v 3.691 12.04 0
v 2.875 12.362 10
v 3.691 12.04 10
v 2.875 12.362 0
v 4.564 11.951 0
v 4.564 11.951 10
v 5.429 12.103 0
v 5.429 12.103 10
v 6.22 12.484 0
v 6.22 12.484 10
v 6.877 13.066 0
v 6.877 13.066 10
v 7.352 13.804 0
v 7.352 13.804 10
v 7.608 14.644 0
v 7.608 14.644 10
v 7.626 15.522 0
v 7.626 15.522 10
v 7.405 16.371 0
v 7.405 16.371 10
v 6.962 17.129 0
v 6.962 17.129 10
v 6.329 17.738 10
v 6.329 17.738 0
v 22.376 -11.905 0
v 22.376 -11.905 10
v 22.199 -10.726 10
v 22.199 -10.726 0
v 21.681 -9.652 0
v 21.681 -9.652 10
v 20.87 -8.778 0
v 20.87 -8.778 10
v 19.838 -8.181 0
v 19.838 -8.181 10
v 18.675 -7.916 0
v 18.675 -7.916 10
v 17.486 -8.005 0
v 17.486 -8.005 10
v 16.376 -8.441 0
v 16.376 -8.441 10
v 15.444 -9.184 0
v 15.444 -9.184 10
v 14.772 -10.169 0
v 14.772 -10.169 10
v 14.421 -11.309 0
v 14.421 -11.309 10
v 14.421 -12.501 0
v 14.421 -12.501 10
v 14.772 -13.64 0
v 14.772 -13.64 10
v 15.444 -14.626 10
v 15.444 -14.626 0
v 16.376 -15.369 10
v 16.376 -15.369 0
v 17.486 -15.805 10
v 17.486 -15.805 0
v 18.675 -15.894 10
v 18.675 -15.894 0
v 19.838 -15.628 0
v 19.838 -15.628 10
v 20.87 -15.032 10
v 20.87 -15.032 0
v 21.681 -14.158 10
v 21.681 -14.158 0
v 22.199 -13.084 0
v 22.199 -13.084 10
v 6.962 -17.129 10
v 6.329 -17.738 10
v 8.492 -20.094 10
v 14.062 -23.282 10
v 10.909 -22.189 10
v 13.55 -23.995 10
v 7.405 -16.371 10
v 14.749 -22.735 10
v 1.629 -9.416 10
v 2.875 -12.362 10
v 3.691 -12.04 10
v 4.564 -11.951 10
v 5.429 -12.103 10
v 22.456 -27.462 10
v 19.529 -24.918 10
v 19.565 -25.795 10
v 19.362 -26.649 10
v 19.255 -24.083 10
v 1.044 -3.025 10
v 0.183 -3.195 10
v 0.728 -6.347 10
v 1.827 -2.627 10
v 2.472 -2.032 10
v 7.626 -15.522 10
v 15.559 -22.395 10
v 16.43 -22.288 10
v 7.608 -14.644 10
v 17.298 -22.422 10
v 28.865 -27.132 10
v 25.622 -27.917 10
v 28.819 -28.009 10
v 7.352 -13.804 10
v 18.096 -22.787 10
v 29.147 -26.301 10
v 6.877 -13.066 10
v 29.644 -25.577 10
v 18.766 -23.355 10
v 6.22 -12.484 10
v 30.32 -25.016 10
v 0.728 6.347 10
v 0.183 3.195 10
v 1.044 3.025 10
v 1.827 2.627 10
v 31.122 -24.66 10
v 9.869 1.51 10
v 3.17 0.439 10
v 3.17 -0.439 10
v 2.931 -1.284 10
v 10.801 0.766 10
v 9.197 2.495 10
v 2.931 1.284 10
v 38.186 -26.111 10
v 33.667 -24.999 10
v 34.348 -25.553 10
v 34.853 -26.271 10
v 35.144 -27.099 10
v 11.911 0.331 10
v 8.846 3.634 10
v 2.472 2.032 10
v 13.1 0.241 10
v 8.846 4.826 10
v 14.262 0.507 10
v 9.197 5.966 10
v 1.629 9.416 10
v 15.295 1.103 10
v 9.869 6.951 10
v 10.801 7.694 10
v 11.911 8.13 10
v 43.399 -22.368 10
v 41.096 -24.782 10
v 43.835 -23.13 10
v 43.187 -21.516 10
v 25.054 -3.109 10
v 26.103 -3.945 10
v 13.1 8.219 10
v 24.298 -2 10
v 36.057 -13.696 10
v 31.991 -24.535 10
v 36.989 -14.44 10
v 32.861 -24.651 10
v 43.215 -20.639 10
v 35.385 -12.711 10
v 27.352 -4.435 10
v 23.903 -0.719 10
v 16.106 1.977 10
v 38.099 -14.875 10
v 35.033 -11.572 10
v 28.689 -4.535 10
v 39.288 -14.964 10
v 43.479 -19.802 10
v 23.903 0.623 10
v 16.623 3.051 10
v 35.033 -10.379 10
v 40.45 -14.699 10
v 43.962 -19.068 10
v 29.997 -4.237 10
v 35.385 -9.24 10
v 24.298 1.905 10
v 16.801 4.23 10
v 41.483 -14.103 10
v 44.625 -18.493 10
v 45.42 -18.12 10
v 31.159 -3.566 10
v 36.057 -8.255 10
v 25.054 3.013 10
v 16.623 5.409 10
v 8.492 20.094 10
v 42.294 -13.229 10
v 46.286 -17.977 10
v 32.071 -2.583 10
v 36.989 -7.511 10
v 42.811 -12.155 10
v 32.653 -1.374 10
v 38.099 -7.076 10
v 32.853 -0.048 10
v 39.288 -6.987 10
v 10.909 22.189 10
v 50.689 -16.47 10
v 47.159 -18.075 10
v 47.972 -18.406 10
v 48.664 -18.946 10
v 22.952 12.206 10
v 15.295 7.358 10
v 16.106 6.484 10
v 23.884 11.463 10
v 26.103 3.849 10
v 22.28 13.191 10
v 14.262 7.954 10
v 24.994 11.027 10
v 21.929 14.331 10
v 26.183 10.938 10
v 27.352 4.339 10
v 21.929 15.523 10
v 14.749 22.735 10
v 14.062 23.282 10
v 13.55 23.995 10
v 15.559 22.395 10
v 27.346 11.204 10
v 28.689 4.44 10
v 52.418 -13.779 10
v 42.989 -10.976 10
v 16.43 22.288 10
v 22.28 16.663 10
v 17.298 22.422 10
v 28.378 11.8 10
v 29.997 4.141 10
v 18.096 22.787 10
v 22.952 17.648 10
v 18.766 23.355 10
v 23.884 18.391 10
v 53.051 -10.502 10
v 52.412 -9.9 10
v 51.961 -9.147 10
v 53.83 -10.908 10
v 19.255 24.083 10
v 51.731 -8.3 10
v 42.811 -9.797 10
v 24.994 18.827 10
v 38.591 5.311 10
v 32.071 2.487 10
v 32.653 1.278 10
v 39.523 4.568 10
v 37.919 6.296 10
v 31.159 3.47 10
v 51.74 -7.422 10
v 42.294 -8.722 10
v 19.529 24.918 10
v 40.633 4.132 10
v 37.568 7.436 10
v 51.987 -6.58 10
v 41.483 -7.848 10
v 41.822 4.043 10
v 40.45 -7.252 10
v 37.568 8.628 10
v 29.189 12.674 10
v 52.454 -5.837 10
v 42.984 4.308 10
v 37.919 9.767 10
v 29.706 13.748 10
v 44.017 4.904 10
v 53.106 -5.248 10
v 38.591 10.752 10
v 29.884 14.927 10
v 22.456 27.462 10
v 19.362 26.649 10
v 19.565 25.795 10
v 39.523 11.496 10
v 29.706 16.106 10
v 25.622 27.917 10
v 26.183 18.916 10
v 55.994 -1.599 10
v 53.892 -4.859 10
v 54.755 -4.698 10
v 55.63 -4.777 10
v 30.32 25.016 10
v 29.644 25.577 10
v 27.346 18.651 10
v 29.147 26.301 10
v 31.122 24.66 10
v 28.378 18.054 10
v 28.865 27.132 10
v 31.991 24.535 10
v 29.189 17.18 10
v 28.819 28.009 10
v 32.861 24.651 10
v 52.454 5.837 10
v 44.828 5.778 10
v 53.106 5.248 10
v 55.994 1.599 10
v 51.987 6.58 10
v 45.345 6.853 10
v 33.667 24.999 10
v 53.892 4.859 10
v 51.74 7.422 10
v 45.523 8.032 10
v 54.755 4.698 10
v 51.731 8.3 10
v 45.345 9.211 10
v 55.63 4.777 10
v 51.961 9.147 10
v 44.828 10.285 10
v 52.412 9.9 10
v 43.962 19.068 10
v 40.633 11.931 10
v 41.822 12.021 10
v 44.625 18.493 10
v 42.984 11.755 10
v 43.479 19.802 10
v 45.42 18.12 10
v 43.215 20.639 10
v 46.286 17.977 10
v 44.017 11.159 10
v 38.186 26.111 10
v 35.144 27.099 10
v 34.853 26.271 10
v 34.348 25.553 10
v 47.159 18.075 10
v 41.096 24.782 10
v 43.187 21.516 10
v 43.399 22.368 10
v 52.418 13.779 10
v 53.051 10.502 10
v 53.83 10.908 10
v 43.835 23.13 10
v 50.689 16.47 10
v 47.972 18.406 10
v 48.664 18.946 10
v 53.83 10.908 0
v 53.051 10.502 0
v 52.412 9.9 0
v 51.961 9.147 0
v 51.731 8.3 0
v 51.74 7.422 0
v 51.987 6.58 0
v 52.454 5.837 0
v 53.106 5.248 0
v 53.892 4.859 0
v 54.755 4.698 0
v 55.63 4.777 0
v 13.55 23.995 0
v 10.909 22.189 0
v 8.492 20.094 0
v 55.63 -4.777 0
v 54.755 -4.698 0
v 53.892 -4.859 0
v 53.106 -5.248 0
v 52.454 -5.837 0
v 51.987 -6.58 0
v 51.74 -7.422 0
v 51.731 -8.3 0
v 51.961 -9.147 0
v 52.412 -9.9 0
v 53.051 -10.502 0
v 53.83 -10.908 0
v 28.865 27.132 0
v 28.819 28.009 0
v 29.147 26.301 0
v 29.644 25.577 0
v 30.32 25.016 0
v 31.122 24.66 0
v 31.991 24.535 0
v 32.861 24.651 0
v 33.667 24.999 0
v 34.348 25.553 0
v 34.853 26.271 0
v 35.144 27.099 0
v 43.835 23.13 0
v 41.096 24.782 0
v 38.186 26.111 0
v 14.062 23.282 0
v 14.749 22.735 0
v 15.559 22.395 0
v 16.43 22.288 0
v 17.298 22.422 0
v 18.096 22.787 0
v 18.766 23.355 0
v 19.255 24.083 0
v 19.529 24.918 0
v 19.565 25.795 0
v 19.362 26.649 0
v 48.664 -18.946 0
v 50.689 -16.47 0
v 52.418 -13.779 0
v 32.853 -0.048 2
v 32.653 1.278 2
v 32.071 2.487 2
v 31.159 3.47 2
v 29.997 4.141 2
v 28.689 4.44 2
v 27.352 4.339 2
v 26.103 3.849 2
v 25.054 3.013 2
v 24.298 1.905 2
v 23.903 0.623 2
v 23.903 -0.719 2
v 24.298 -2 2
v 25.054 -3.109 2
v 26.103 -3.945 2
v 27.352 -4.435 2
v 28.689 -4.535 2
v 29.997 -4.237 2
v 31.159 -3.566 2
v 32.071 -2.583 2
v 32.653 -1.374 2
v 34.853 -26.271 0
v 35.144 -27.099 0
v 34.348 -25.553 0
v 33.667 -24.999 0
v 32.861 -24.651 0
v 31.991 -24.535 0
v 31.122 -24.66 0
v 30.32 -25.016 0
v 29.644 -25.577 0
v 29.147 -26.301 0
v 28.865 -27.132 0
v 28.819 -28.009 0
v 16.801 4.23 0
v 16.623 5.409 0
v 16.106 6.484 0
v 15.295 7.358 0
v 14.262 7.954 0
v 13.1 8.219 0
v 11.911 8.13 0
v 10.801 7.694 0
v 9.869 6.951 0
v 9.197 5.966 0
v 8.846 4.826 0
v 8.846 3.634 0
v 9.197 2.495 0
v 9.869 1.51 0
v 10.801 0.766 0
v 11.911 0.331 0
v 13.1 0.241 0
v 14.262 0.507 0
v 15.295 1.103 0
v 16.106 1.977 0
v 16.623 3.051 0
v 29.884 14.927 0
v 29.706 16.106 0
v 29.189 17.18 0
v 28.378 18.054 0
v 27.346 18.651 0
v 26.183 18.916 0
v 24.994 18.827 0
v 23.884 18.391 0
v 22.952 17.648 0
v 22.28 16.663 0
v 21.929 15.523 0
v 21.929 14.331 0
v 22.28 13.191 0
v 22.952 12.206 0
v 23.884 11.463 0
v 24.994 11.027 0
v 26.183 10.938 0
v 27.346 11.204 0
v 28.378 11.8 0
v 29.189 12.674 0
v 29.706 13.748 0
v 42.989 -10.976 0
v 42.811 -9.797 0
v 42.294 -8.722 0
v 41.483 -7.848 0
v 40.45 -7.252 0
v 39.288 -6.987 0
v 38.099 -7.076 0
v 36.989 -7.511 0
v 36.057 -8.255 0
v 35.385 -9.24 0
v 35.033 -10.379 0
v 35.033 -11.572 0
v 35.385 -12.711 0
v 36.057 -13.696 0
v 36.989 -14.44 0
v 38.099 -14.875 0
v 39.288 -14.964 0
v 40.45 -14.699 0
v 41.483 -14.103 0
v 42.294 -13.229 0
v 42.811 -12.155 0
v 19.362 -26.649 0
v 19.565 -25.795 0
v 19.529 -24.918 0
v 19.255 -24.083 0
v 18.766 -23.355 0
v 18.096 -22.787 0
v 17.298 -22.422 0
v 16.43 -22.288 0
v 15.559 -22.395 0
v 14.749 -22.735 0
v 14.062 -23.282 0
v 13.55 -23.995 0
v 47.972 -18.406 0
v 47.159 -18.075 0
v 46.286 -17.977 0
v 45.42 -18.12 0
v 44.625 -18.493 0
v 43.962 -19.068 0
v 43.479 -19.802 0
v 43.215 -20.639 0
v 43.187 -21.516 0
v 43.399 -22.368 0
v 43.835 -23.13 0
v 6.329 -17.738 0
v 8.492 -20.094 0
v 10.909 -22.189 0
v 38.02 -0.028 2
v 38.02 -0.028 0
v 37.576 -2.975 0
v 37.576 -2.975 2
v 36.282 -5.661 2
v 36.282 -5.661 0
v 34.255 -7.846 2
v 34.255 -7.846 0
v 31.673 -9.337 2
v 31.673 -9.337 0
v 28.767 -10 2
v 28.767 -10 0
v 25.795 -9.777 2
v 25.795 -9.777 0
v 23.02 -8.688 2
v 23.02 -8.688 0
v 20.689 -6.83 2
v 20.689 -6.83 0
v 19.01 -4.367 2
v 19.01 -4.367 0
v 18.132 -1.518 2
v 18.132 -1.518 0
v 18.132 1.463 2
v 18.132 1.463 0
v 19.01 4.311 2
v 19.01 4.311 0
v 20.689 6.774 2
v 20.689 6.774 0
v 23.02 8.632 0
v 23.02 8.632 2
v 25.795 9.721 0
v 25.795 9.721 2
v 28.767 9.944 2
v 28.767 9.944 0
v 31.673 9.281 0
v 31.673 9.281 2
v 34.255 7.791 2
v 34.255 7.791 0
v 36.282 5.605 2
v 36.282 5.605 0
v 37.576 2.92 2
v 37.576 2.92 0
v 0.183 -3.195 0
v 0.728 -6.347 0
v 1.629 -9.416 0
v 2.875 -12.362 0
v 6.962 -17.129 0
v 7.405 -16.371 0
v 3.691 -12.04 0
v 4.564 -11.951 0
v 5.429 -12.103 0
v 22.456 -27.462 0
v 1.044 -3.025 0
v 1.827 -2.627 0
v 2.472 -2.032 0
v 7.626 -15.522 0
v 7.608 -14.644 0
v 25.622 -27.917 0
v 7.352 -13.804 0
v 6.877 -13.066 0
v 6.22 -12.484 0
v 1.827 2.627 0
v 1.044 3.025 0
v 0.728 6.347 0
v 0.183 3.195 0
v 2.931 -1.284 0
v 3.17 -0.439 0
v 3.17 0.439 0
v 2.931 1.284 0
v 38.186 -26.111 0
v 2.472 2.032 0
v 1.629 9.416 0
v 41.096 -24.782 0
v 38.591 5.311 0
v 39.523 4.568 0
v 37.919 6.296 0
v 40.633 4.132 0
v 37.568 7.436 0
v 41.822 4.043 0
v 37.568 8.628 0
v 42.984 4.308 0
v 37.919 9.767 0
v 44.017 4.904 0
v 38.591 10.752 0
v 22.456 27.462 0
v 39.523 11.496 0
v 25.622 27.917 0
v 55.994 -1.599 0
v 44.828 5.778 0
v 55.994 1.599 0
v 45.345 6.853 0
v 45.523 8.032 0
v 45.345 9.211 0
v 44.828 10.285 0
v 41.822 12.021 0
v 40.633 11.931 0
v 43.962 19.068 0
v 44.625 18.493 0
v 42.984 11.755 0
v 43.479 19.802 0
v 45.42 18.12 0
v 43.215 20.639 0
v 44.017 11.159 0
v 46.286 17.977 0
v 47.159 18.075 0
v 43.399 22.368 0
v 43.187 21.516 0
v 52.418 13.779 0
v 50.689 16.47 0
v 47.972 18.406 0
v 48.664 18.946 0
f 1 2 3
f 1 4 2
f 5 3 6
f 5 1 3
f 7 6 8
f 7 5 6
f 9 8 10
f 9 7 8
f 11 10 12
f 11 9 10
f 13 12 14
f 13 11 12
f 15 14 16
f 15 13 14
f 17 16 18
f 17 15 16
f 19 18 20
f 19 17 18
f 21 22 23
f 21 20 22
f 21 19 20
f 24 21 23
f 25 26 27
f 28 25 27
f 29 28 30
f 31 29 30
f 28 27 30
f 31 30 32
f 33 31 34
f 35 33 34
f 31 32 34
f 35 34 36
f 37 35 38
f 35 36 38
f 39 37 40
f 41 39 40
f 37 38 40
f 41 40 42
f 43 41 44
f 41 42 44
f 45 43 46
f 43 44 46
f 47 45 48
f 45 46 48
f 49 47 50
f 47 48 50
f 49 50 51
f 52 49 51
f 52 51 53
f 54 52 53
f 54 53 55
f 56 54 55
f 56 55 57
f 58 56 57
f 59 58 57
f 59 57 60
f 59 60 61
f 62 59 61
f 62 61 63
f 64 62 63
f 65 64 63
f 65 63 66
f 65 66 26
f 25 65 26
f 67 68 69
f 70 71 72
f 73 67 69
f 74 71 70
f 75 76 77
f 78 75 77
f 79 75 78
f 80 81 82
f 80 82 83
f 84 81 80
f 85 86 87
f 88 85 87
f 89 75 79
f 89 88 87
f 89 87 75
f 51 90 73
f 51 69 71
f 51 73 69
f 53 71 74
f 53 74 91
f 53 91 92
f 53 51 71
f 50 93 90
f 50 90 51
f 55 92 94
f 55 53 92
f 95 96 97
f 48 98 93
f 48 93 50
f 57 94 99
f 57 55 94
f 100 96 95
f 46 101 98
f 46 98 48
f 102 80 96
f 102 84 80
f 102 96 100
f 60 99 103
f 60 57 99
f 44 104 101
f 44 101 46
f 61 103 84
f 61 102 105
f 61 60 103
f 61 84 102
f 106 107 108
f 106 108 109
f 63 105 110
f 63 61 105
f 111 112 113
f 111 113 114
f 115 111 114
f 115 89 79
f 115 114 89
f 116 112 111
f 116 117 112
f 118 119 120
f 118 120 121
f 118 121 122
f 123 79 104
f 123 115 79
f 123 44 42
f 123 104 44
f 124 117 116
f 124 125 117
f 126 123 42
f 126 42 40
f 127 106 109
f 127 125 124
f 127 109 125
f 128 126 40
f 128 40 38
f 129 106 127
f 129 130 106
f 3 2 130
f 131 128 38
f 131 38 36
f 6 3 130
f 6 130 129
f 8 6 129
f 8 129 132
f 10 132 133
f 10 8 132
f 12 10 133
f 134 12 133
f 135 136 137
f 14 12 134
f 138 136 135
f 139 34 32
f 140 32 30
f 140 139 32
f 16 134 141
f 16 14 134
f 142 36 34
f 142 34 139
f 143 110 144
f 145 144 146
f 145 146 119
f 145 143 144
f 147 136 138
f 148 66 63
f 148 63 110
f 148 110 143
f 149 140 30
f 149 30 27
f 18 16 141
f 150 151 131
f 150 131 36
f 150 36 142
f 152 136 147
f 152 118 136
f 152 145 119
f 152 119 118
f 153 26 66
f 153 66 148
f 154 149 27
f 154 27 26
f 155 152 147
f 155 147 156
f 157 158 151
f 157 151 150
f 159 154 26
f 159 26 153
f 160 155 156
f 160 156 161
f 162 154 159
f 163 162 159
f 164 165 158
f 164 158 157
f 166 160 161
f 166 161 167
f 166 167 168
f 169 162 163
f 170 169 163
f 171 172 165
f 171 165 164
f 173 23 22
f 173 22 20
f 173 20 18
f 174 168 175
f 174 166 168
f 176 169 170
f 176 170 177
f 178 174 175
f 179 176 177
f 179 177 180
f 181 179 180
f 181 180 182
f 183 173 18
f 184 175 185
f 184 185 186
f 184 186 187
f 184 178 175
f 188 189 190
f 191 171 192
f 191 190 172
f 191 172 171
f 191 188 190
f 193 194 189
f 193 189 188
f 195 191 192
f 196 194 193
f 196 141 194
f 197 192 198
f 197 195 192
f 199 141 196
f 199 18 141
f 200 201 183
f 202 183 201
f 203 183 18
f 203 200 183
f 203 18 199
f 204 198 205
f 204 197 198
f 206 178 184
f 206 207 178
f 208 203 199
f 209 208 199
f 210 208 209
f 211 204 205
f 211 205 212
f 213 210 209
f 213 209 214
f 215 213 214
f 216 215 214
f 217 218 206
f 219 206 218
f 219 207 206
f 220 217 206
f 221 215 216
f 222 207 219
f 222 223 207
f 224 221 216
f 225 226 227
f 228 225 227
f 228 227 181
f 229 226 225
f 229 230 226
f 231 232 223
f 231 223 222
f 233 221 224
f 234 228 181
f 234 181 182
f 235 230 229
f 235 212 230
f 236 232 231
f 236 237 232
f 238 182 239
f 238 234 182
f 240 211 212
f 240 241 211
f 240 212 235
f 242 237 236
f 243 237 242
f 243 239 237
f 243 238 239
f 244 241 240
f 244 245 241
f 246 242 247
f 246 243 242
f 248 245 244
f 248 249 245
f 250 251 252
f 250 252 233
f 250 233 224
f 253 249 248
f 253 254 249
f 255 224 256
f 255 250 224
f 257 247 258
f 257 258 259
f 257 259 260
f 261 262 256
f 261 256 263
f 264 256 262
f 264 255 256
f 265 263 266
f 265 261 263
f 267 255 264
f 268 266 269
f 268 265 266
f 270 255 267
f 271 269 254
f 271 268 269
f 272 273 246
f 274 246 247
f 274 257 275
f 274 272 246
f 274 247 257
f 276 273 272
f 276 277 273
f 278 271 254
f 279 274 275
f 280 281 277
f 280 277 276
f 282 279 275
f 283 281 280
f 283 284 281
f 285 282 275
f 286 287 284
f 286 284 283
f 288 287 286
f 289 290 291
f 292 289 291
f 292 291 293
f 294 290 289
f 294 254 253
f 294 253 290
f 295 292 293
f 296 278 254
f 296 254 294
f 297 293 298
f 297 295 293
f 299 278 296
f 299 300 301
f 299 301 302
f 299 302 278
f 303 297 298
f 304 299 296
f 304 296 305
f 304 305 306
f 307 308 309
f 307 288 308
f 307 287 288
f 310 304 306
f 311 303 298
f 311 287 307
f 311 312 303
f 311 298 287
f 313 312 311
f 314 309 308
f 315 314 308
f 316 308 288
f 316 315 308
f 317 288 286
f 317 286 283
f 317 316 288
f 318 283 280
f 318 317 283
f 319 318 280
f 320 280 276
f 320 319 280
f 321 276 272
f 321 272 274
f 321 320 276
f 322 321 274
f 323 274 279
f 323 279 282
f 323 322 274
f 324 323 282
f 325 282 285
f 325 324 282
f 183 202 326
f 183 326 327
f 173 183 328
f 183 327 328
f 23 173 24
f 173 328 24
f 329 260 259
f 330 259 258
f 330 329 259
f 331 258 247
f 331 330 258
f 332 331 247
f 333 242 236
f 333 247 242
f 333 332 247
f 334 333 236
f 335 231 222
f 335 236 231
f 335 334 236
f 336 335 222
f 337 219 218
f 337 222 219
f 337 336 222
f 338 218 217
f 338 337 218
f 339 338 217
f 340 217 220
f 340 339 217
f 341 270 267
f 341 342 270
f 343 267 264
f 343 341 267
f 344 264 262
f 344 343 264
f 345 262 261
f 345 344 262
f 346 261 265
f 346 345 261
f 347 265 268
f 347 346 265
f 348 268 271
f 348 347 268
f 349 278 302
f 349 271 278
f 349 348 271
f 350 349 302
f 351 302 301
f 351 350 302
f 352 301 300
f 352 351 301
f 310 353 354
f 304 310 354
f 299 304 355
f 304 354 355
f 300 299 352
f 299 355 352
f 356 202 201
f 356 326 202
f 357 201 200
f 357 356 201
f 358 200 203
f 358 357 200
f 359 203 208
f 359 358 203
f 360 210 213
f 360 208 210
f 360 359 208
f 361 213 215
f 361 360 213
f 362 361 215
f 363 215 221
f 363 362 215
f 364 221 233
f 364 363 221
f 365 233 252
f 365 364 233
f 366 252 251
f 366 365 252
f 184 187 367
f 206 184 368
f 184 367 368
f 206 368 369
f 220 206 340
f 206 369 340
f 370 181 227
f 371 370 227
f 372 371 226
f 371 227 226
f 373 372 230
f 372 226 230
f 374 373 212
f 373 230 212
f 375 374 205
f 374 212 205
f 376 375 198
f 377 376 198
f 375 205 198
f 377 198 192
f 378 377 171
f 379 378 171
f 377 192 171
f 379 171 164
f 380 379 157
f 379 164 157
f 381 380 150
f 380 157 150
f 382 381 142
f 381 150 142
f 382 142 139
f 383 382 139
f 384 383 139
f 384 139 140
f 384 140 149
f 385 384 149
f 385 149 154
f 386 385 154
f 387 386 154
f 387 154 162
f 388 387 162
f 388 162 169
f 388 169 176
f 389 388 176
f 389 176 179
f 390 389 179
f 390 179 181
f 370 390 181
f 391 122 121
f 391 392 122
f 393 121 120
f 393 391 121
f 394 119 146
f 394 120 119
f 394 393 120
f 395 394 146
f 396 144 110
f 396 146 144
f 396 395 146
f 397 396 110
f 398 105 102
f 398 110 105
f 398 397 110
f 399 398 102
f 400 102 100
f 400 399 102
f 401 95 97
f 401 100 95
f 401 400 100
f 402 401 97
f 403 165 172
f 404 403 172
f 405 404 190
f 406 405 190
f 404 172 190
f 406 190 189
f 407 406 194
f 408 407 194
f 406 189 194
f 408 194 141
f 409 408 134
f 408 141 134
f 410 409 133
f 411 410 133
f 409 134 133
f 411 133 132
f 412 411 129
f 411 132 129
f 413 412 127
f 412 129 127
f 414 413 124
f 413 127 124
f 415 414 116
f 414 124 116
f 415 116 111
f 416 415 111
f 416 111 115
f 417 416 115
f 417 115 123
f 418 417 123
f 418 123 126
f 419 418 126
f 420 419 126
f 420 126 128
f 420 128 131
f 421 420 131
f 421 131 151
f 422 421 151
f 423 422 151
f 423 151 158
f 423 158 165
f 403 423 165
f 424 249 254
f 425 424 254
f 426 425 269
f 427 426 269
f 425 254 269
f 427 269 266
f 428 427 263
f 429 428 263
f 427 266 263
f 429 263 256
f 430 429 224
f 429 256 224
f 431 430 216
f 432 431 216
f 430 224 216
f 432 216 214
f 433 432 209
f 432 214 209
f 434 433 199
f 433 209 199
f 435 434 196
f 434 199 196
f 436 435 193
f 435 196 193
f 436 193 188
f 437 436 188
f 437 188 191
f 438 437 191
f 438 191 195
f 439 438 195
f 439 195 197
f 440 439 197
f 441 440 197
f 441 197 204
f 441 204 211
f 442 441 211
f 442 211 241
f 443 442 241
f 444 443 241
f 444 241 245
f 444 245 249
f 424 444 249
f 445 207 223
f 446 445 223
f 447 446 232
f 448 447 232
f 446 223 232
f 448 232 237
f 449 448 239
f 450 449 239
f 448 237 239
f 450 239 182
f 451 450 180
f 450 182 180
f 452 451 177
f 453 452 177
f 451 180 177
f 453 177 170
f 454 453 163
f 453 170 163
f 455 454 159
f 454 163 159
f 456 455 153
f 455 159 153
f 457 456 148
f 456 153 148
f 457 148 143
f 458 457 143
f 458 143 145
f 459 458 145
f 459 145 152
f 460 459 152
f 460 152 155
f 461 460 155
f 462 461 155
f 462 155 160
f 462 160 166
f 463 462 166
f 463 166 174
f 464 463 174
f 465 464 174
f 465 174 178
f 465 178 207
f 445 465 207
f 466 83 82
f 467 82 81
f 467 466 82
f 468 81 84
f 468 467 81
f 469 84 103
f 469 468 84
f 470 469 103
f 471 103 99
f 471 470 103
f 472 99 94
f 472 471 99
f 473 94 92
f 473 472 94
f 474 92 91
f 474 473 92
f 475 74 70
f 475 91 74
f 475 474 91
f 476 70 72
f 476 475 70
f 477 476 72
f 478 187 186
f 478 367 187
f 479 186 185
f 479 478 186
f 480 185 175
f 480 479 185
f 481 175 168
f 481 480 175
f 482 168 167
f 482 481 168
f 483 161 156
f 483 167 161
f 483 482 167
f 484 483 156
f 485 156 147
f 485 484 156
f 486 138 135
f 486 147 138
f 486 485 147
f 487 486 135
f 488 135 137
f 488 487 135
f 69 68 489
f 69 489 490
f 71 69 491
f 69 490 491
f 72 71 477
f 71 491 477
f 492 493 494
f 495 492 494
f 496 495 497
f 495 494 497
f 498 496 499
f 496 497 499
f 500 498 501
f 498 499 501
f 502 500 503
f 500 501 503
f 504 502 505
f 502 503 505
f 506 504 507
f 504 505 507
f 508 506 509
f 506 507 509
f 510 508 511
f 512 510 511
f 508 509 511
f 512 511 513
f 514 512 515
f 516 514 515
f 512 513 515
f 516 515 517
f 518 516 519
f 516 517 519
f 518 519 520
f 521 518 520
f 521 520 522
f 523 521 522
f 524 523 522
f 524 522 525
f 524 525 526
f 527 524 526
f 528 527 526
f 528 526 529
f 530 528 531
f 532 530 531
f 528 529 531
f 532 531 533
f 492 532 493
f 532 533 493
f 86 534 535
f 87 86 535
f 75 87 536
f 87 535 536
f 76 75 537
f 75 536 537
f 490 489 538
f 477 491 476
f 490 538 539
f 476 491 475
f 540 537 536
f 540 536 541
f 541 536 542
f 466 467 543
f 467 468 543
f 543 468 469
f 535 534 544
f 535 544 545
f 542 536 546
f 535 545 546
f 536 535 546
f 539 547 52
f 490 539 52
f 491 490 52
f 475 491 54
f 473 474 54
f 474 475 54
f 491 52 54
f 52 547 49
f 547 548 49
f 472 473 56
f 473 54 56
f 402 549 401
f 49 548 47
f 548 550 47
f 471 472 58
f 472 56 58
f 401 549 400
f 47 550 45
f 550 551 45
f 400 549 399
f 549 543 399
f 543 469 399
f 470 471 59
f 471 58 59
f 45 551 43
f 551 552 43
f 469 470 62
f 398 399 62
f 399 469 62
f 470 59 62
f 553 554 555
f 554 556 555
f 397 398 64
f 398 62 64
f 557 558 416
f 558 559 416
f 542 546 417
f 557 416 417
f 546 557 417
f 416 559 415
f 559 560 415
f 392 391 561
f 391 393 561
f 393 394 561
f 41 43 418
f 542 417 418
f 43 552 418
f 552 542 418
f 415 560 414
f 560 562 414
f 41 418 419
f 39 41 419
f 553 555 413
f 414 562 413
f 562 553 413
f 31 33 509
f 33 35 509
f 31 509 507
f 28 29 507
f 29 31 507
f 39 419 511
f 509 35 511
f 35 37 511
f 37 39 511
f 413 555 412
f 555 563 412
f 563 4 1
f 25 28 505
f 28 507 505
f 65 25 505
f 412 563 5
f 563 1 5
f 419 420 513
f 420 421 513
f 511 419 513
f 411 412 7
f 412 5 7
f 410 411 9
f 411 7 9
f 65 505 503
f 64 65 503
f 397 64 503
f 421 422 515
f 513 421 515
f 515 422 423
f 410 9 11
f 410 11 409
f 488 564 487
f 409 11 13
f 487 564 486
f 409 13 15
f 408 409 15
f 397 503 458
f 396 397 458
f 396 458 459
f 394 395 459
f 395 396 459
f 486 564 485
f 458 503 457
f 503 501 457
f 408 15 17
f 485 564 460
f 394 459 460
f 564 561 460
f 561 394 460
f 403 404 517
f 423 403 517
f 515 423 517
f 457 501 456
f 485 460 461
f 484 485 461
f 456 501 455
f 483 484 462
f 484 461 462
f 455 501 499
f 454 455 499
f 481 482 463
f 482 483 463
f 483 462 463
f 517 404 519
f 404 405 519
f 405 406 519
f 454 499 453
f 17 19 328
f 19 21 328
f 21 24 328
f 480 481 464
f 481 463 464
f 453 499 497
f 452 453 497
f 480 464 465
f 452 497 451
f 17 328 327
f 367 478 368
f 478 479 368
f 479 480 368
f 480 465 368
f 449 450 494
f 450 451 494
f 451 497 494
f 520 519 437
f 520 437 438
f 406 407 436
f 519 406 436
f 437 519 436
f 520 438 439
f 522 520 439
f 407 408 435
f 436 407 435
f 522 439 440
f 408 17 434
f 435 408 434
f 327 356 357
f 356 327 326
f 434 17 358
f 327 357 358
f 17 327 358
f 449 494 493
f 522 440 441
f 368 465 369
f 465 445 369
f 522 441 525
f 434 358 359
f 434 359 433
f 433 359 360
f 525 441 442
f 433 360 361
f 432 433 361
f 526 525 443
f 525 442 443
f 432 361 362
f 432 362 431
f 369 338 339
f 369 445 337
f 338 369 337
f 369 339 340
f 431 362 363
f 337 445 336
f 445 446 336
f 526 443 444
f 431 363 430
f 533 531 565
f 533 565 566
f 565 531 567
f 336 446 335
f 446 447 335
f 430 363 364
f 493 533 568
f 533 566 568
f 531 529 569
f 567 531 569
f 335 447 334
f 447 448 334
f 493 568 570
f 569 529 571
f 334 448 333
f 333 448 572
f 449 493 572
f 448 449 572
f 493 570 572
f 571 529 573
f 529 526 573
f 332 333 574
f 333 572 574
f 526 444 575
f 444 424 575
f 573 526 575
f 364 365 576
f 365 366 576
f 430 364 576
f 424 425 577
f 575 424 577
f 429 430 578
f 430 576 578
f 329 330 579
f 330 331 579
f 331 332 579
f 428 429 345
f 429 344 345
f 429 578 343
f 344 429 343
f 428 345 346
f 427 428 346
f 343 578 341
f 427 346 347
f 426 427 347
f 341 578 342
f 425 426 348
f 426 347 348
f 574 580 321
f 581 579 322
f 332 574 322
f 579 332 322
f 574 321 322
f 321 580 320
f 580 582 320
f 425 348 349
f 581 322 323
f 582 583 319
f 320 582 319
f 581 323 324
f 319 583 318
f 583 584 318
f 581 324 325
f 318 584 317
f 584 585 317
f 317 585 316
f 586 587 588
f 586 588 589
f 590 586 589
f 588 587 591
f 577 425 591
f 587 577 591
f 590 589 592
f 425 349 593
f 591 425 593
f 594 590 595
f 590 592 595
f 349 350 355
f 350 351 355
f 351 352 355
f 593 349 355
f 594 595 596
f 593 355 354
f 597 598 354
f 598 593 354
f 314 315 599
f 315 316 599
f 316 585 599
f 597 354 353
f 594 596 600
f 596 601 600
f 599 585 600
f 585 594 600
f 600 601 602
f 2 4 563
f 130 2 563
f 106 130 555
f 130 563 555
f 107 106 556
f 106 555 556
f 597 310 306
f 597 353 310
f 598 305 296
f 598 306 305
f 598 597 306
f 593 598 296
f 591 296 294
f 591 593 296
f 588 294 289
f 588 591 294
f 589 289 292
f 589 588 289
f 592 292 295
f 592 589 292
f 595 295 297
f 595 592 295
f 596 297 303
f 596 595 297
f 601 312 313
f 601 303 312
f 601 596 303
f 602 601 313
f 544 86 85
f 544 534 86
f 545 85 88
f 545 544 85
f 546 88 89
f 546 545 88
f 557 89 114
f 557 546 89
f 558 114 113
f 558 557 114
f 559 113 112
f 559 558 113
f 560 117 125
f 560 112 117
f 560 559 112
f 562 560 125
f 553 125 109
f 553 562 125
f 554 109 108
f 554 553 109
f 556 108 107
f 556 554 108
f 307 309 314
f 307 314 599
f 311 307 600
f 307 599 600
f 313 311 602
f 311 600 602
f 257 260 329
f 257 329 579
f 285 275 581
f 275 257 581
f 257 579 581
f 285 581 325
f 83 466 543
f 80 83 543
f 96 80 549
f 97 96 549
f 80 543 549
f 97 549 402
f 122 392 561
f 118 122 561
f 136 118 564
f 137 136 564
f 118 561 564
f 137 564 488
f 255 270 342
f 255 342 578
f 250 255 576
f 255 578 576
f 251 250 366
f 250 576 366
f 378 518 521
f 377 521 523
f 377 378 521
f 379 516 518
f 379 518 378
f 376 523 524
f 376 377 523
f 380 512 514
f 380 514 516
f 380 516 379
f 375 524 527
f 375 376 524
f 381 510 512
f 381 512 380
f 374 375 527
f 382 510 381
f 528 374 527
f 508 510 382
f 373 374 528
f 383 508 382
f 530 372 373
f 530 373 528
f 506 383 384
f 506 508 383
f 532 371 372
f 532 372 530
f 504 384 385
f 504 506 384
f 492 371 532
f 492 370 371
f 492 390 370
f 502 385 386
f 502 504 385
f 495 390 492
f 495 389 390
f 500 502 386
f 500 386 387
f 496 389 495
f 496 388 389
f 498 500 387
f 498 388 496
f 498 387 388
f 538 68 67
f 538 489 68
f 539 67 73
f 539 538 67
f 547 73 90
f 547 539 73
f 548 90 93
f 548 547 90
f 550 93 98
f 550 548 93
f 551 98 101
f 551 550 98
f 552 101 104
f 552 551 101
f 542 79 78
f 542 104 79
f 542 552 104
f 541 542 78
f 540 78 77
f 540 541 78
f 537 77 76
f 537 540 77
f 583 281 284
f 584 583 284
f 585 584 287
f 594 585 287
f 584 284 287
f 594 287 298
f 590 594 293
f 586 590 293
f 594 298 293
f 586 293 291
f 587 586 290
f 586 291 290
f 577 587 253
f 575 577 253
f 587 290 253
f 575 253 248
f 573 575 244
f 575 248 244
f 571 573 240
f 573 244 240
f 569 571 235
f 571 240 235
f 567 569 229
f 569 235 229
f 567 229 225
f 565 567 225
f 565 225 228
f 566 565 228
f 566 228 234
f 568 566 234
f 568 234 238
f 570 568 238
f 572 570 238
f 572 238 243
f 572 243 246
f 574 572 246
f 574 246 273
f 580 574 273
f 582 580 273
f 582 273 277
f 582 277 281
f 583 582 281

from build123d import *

# Parameters (mm, degrees)
CYLINDER009_R      = 3.2
CYLINDER009_DEPTH  = 10
ARRAY001_COUNT     = 11
CYLINDER010_R      = 28.02
CYLINDER010_DEPTH  = 10
SKETCH002_R        = 4.5
SKETCH002_R_2      = 4
POCKET001_DEPTH    = 10.001
SKETCH003_R        = 10
POCKET002002_DEPTH = 2


with BuildPart() as dientes001:
    # Cylinder009 → Cylinder009 (new body)
    with BuildSketch(Plane.XY):
        Circle(CYLINDER009_R)
    extrude(amount=CYLINDER009_DEPTH)

    # Array001: Dientes001 ×11 about axis
    array001_axis = Axis((28.02, 0, 0), (0, 0, 1))


with BuildPart() as dientes001_1:
    add(dientes001.part)
    for i in range(1, ARRAY001_COUNT):
        add(dientes001.part.rotate(array001_axis, i * 360 / ARRAY001_COUNT))


with BuildPart() as taladro_servohorn:
    # Cylinder010 → Cylinder010 (new body)
    with BuildSketch(Plane(origin=(28.02, 0, 0), x_dir=(1, 0, 0), z_dir=(0, 0, 1))):
        Circle(CYLINDER010_R)
    extrude(amount=CYLINDER010_DEPTH)

    # Cut007: cut Dientes001
    add(dientes001_1.part, mode=Mode.SUBTRACT)

    # Sketch002 → Pocket001 (cut, through all)
    with BuildSketch(Plane.XY.offset(10)):
        with Locations((28.352856, -0.047906)):
            Circle(SKETCH002_R)
        with Locations((18.376312, -11.904833)):
            Circle(SKETCH002_R_2)
        with Locations((41.523029, 8.031758)):
            Circle(SKETCH002_R_2)
        with Locations((38.98872, -10.975584)):
            Circle(SKETCH002_R_2)
        with Locations((12.800824, 4.230289)):
            Circle(SKETCH002_R_2)
        with Locations((25.88417, 14.927018)):
            Circle(SKETCH002_R_2)
    extrude(amount=-POCKET001_DEPTH, mode=Mode.SUBTRACT)

    # Sketch003 → Pocket002002 (cut)
    with BuildSketch(Plane(origin=(0, 0, 0), x_dir=(1, 0, 0), z_dir=(0, 0, -1))):
        with Locations((28.02, 0.027806)):
            Circle(SKETCH003_R)
    extrude(amount=-POCKET002002_DEPTH, mode=Mode.SUBTRACT)


solid = taladro_servohorn.part
